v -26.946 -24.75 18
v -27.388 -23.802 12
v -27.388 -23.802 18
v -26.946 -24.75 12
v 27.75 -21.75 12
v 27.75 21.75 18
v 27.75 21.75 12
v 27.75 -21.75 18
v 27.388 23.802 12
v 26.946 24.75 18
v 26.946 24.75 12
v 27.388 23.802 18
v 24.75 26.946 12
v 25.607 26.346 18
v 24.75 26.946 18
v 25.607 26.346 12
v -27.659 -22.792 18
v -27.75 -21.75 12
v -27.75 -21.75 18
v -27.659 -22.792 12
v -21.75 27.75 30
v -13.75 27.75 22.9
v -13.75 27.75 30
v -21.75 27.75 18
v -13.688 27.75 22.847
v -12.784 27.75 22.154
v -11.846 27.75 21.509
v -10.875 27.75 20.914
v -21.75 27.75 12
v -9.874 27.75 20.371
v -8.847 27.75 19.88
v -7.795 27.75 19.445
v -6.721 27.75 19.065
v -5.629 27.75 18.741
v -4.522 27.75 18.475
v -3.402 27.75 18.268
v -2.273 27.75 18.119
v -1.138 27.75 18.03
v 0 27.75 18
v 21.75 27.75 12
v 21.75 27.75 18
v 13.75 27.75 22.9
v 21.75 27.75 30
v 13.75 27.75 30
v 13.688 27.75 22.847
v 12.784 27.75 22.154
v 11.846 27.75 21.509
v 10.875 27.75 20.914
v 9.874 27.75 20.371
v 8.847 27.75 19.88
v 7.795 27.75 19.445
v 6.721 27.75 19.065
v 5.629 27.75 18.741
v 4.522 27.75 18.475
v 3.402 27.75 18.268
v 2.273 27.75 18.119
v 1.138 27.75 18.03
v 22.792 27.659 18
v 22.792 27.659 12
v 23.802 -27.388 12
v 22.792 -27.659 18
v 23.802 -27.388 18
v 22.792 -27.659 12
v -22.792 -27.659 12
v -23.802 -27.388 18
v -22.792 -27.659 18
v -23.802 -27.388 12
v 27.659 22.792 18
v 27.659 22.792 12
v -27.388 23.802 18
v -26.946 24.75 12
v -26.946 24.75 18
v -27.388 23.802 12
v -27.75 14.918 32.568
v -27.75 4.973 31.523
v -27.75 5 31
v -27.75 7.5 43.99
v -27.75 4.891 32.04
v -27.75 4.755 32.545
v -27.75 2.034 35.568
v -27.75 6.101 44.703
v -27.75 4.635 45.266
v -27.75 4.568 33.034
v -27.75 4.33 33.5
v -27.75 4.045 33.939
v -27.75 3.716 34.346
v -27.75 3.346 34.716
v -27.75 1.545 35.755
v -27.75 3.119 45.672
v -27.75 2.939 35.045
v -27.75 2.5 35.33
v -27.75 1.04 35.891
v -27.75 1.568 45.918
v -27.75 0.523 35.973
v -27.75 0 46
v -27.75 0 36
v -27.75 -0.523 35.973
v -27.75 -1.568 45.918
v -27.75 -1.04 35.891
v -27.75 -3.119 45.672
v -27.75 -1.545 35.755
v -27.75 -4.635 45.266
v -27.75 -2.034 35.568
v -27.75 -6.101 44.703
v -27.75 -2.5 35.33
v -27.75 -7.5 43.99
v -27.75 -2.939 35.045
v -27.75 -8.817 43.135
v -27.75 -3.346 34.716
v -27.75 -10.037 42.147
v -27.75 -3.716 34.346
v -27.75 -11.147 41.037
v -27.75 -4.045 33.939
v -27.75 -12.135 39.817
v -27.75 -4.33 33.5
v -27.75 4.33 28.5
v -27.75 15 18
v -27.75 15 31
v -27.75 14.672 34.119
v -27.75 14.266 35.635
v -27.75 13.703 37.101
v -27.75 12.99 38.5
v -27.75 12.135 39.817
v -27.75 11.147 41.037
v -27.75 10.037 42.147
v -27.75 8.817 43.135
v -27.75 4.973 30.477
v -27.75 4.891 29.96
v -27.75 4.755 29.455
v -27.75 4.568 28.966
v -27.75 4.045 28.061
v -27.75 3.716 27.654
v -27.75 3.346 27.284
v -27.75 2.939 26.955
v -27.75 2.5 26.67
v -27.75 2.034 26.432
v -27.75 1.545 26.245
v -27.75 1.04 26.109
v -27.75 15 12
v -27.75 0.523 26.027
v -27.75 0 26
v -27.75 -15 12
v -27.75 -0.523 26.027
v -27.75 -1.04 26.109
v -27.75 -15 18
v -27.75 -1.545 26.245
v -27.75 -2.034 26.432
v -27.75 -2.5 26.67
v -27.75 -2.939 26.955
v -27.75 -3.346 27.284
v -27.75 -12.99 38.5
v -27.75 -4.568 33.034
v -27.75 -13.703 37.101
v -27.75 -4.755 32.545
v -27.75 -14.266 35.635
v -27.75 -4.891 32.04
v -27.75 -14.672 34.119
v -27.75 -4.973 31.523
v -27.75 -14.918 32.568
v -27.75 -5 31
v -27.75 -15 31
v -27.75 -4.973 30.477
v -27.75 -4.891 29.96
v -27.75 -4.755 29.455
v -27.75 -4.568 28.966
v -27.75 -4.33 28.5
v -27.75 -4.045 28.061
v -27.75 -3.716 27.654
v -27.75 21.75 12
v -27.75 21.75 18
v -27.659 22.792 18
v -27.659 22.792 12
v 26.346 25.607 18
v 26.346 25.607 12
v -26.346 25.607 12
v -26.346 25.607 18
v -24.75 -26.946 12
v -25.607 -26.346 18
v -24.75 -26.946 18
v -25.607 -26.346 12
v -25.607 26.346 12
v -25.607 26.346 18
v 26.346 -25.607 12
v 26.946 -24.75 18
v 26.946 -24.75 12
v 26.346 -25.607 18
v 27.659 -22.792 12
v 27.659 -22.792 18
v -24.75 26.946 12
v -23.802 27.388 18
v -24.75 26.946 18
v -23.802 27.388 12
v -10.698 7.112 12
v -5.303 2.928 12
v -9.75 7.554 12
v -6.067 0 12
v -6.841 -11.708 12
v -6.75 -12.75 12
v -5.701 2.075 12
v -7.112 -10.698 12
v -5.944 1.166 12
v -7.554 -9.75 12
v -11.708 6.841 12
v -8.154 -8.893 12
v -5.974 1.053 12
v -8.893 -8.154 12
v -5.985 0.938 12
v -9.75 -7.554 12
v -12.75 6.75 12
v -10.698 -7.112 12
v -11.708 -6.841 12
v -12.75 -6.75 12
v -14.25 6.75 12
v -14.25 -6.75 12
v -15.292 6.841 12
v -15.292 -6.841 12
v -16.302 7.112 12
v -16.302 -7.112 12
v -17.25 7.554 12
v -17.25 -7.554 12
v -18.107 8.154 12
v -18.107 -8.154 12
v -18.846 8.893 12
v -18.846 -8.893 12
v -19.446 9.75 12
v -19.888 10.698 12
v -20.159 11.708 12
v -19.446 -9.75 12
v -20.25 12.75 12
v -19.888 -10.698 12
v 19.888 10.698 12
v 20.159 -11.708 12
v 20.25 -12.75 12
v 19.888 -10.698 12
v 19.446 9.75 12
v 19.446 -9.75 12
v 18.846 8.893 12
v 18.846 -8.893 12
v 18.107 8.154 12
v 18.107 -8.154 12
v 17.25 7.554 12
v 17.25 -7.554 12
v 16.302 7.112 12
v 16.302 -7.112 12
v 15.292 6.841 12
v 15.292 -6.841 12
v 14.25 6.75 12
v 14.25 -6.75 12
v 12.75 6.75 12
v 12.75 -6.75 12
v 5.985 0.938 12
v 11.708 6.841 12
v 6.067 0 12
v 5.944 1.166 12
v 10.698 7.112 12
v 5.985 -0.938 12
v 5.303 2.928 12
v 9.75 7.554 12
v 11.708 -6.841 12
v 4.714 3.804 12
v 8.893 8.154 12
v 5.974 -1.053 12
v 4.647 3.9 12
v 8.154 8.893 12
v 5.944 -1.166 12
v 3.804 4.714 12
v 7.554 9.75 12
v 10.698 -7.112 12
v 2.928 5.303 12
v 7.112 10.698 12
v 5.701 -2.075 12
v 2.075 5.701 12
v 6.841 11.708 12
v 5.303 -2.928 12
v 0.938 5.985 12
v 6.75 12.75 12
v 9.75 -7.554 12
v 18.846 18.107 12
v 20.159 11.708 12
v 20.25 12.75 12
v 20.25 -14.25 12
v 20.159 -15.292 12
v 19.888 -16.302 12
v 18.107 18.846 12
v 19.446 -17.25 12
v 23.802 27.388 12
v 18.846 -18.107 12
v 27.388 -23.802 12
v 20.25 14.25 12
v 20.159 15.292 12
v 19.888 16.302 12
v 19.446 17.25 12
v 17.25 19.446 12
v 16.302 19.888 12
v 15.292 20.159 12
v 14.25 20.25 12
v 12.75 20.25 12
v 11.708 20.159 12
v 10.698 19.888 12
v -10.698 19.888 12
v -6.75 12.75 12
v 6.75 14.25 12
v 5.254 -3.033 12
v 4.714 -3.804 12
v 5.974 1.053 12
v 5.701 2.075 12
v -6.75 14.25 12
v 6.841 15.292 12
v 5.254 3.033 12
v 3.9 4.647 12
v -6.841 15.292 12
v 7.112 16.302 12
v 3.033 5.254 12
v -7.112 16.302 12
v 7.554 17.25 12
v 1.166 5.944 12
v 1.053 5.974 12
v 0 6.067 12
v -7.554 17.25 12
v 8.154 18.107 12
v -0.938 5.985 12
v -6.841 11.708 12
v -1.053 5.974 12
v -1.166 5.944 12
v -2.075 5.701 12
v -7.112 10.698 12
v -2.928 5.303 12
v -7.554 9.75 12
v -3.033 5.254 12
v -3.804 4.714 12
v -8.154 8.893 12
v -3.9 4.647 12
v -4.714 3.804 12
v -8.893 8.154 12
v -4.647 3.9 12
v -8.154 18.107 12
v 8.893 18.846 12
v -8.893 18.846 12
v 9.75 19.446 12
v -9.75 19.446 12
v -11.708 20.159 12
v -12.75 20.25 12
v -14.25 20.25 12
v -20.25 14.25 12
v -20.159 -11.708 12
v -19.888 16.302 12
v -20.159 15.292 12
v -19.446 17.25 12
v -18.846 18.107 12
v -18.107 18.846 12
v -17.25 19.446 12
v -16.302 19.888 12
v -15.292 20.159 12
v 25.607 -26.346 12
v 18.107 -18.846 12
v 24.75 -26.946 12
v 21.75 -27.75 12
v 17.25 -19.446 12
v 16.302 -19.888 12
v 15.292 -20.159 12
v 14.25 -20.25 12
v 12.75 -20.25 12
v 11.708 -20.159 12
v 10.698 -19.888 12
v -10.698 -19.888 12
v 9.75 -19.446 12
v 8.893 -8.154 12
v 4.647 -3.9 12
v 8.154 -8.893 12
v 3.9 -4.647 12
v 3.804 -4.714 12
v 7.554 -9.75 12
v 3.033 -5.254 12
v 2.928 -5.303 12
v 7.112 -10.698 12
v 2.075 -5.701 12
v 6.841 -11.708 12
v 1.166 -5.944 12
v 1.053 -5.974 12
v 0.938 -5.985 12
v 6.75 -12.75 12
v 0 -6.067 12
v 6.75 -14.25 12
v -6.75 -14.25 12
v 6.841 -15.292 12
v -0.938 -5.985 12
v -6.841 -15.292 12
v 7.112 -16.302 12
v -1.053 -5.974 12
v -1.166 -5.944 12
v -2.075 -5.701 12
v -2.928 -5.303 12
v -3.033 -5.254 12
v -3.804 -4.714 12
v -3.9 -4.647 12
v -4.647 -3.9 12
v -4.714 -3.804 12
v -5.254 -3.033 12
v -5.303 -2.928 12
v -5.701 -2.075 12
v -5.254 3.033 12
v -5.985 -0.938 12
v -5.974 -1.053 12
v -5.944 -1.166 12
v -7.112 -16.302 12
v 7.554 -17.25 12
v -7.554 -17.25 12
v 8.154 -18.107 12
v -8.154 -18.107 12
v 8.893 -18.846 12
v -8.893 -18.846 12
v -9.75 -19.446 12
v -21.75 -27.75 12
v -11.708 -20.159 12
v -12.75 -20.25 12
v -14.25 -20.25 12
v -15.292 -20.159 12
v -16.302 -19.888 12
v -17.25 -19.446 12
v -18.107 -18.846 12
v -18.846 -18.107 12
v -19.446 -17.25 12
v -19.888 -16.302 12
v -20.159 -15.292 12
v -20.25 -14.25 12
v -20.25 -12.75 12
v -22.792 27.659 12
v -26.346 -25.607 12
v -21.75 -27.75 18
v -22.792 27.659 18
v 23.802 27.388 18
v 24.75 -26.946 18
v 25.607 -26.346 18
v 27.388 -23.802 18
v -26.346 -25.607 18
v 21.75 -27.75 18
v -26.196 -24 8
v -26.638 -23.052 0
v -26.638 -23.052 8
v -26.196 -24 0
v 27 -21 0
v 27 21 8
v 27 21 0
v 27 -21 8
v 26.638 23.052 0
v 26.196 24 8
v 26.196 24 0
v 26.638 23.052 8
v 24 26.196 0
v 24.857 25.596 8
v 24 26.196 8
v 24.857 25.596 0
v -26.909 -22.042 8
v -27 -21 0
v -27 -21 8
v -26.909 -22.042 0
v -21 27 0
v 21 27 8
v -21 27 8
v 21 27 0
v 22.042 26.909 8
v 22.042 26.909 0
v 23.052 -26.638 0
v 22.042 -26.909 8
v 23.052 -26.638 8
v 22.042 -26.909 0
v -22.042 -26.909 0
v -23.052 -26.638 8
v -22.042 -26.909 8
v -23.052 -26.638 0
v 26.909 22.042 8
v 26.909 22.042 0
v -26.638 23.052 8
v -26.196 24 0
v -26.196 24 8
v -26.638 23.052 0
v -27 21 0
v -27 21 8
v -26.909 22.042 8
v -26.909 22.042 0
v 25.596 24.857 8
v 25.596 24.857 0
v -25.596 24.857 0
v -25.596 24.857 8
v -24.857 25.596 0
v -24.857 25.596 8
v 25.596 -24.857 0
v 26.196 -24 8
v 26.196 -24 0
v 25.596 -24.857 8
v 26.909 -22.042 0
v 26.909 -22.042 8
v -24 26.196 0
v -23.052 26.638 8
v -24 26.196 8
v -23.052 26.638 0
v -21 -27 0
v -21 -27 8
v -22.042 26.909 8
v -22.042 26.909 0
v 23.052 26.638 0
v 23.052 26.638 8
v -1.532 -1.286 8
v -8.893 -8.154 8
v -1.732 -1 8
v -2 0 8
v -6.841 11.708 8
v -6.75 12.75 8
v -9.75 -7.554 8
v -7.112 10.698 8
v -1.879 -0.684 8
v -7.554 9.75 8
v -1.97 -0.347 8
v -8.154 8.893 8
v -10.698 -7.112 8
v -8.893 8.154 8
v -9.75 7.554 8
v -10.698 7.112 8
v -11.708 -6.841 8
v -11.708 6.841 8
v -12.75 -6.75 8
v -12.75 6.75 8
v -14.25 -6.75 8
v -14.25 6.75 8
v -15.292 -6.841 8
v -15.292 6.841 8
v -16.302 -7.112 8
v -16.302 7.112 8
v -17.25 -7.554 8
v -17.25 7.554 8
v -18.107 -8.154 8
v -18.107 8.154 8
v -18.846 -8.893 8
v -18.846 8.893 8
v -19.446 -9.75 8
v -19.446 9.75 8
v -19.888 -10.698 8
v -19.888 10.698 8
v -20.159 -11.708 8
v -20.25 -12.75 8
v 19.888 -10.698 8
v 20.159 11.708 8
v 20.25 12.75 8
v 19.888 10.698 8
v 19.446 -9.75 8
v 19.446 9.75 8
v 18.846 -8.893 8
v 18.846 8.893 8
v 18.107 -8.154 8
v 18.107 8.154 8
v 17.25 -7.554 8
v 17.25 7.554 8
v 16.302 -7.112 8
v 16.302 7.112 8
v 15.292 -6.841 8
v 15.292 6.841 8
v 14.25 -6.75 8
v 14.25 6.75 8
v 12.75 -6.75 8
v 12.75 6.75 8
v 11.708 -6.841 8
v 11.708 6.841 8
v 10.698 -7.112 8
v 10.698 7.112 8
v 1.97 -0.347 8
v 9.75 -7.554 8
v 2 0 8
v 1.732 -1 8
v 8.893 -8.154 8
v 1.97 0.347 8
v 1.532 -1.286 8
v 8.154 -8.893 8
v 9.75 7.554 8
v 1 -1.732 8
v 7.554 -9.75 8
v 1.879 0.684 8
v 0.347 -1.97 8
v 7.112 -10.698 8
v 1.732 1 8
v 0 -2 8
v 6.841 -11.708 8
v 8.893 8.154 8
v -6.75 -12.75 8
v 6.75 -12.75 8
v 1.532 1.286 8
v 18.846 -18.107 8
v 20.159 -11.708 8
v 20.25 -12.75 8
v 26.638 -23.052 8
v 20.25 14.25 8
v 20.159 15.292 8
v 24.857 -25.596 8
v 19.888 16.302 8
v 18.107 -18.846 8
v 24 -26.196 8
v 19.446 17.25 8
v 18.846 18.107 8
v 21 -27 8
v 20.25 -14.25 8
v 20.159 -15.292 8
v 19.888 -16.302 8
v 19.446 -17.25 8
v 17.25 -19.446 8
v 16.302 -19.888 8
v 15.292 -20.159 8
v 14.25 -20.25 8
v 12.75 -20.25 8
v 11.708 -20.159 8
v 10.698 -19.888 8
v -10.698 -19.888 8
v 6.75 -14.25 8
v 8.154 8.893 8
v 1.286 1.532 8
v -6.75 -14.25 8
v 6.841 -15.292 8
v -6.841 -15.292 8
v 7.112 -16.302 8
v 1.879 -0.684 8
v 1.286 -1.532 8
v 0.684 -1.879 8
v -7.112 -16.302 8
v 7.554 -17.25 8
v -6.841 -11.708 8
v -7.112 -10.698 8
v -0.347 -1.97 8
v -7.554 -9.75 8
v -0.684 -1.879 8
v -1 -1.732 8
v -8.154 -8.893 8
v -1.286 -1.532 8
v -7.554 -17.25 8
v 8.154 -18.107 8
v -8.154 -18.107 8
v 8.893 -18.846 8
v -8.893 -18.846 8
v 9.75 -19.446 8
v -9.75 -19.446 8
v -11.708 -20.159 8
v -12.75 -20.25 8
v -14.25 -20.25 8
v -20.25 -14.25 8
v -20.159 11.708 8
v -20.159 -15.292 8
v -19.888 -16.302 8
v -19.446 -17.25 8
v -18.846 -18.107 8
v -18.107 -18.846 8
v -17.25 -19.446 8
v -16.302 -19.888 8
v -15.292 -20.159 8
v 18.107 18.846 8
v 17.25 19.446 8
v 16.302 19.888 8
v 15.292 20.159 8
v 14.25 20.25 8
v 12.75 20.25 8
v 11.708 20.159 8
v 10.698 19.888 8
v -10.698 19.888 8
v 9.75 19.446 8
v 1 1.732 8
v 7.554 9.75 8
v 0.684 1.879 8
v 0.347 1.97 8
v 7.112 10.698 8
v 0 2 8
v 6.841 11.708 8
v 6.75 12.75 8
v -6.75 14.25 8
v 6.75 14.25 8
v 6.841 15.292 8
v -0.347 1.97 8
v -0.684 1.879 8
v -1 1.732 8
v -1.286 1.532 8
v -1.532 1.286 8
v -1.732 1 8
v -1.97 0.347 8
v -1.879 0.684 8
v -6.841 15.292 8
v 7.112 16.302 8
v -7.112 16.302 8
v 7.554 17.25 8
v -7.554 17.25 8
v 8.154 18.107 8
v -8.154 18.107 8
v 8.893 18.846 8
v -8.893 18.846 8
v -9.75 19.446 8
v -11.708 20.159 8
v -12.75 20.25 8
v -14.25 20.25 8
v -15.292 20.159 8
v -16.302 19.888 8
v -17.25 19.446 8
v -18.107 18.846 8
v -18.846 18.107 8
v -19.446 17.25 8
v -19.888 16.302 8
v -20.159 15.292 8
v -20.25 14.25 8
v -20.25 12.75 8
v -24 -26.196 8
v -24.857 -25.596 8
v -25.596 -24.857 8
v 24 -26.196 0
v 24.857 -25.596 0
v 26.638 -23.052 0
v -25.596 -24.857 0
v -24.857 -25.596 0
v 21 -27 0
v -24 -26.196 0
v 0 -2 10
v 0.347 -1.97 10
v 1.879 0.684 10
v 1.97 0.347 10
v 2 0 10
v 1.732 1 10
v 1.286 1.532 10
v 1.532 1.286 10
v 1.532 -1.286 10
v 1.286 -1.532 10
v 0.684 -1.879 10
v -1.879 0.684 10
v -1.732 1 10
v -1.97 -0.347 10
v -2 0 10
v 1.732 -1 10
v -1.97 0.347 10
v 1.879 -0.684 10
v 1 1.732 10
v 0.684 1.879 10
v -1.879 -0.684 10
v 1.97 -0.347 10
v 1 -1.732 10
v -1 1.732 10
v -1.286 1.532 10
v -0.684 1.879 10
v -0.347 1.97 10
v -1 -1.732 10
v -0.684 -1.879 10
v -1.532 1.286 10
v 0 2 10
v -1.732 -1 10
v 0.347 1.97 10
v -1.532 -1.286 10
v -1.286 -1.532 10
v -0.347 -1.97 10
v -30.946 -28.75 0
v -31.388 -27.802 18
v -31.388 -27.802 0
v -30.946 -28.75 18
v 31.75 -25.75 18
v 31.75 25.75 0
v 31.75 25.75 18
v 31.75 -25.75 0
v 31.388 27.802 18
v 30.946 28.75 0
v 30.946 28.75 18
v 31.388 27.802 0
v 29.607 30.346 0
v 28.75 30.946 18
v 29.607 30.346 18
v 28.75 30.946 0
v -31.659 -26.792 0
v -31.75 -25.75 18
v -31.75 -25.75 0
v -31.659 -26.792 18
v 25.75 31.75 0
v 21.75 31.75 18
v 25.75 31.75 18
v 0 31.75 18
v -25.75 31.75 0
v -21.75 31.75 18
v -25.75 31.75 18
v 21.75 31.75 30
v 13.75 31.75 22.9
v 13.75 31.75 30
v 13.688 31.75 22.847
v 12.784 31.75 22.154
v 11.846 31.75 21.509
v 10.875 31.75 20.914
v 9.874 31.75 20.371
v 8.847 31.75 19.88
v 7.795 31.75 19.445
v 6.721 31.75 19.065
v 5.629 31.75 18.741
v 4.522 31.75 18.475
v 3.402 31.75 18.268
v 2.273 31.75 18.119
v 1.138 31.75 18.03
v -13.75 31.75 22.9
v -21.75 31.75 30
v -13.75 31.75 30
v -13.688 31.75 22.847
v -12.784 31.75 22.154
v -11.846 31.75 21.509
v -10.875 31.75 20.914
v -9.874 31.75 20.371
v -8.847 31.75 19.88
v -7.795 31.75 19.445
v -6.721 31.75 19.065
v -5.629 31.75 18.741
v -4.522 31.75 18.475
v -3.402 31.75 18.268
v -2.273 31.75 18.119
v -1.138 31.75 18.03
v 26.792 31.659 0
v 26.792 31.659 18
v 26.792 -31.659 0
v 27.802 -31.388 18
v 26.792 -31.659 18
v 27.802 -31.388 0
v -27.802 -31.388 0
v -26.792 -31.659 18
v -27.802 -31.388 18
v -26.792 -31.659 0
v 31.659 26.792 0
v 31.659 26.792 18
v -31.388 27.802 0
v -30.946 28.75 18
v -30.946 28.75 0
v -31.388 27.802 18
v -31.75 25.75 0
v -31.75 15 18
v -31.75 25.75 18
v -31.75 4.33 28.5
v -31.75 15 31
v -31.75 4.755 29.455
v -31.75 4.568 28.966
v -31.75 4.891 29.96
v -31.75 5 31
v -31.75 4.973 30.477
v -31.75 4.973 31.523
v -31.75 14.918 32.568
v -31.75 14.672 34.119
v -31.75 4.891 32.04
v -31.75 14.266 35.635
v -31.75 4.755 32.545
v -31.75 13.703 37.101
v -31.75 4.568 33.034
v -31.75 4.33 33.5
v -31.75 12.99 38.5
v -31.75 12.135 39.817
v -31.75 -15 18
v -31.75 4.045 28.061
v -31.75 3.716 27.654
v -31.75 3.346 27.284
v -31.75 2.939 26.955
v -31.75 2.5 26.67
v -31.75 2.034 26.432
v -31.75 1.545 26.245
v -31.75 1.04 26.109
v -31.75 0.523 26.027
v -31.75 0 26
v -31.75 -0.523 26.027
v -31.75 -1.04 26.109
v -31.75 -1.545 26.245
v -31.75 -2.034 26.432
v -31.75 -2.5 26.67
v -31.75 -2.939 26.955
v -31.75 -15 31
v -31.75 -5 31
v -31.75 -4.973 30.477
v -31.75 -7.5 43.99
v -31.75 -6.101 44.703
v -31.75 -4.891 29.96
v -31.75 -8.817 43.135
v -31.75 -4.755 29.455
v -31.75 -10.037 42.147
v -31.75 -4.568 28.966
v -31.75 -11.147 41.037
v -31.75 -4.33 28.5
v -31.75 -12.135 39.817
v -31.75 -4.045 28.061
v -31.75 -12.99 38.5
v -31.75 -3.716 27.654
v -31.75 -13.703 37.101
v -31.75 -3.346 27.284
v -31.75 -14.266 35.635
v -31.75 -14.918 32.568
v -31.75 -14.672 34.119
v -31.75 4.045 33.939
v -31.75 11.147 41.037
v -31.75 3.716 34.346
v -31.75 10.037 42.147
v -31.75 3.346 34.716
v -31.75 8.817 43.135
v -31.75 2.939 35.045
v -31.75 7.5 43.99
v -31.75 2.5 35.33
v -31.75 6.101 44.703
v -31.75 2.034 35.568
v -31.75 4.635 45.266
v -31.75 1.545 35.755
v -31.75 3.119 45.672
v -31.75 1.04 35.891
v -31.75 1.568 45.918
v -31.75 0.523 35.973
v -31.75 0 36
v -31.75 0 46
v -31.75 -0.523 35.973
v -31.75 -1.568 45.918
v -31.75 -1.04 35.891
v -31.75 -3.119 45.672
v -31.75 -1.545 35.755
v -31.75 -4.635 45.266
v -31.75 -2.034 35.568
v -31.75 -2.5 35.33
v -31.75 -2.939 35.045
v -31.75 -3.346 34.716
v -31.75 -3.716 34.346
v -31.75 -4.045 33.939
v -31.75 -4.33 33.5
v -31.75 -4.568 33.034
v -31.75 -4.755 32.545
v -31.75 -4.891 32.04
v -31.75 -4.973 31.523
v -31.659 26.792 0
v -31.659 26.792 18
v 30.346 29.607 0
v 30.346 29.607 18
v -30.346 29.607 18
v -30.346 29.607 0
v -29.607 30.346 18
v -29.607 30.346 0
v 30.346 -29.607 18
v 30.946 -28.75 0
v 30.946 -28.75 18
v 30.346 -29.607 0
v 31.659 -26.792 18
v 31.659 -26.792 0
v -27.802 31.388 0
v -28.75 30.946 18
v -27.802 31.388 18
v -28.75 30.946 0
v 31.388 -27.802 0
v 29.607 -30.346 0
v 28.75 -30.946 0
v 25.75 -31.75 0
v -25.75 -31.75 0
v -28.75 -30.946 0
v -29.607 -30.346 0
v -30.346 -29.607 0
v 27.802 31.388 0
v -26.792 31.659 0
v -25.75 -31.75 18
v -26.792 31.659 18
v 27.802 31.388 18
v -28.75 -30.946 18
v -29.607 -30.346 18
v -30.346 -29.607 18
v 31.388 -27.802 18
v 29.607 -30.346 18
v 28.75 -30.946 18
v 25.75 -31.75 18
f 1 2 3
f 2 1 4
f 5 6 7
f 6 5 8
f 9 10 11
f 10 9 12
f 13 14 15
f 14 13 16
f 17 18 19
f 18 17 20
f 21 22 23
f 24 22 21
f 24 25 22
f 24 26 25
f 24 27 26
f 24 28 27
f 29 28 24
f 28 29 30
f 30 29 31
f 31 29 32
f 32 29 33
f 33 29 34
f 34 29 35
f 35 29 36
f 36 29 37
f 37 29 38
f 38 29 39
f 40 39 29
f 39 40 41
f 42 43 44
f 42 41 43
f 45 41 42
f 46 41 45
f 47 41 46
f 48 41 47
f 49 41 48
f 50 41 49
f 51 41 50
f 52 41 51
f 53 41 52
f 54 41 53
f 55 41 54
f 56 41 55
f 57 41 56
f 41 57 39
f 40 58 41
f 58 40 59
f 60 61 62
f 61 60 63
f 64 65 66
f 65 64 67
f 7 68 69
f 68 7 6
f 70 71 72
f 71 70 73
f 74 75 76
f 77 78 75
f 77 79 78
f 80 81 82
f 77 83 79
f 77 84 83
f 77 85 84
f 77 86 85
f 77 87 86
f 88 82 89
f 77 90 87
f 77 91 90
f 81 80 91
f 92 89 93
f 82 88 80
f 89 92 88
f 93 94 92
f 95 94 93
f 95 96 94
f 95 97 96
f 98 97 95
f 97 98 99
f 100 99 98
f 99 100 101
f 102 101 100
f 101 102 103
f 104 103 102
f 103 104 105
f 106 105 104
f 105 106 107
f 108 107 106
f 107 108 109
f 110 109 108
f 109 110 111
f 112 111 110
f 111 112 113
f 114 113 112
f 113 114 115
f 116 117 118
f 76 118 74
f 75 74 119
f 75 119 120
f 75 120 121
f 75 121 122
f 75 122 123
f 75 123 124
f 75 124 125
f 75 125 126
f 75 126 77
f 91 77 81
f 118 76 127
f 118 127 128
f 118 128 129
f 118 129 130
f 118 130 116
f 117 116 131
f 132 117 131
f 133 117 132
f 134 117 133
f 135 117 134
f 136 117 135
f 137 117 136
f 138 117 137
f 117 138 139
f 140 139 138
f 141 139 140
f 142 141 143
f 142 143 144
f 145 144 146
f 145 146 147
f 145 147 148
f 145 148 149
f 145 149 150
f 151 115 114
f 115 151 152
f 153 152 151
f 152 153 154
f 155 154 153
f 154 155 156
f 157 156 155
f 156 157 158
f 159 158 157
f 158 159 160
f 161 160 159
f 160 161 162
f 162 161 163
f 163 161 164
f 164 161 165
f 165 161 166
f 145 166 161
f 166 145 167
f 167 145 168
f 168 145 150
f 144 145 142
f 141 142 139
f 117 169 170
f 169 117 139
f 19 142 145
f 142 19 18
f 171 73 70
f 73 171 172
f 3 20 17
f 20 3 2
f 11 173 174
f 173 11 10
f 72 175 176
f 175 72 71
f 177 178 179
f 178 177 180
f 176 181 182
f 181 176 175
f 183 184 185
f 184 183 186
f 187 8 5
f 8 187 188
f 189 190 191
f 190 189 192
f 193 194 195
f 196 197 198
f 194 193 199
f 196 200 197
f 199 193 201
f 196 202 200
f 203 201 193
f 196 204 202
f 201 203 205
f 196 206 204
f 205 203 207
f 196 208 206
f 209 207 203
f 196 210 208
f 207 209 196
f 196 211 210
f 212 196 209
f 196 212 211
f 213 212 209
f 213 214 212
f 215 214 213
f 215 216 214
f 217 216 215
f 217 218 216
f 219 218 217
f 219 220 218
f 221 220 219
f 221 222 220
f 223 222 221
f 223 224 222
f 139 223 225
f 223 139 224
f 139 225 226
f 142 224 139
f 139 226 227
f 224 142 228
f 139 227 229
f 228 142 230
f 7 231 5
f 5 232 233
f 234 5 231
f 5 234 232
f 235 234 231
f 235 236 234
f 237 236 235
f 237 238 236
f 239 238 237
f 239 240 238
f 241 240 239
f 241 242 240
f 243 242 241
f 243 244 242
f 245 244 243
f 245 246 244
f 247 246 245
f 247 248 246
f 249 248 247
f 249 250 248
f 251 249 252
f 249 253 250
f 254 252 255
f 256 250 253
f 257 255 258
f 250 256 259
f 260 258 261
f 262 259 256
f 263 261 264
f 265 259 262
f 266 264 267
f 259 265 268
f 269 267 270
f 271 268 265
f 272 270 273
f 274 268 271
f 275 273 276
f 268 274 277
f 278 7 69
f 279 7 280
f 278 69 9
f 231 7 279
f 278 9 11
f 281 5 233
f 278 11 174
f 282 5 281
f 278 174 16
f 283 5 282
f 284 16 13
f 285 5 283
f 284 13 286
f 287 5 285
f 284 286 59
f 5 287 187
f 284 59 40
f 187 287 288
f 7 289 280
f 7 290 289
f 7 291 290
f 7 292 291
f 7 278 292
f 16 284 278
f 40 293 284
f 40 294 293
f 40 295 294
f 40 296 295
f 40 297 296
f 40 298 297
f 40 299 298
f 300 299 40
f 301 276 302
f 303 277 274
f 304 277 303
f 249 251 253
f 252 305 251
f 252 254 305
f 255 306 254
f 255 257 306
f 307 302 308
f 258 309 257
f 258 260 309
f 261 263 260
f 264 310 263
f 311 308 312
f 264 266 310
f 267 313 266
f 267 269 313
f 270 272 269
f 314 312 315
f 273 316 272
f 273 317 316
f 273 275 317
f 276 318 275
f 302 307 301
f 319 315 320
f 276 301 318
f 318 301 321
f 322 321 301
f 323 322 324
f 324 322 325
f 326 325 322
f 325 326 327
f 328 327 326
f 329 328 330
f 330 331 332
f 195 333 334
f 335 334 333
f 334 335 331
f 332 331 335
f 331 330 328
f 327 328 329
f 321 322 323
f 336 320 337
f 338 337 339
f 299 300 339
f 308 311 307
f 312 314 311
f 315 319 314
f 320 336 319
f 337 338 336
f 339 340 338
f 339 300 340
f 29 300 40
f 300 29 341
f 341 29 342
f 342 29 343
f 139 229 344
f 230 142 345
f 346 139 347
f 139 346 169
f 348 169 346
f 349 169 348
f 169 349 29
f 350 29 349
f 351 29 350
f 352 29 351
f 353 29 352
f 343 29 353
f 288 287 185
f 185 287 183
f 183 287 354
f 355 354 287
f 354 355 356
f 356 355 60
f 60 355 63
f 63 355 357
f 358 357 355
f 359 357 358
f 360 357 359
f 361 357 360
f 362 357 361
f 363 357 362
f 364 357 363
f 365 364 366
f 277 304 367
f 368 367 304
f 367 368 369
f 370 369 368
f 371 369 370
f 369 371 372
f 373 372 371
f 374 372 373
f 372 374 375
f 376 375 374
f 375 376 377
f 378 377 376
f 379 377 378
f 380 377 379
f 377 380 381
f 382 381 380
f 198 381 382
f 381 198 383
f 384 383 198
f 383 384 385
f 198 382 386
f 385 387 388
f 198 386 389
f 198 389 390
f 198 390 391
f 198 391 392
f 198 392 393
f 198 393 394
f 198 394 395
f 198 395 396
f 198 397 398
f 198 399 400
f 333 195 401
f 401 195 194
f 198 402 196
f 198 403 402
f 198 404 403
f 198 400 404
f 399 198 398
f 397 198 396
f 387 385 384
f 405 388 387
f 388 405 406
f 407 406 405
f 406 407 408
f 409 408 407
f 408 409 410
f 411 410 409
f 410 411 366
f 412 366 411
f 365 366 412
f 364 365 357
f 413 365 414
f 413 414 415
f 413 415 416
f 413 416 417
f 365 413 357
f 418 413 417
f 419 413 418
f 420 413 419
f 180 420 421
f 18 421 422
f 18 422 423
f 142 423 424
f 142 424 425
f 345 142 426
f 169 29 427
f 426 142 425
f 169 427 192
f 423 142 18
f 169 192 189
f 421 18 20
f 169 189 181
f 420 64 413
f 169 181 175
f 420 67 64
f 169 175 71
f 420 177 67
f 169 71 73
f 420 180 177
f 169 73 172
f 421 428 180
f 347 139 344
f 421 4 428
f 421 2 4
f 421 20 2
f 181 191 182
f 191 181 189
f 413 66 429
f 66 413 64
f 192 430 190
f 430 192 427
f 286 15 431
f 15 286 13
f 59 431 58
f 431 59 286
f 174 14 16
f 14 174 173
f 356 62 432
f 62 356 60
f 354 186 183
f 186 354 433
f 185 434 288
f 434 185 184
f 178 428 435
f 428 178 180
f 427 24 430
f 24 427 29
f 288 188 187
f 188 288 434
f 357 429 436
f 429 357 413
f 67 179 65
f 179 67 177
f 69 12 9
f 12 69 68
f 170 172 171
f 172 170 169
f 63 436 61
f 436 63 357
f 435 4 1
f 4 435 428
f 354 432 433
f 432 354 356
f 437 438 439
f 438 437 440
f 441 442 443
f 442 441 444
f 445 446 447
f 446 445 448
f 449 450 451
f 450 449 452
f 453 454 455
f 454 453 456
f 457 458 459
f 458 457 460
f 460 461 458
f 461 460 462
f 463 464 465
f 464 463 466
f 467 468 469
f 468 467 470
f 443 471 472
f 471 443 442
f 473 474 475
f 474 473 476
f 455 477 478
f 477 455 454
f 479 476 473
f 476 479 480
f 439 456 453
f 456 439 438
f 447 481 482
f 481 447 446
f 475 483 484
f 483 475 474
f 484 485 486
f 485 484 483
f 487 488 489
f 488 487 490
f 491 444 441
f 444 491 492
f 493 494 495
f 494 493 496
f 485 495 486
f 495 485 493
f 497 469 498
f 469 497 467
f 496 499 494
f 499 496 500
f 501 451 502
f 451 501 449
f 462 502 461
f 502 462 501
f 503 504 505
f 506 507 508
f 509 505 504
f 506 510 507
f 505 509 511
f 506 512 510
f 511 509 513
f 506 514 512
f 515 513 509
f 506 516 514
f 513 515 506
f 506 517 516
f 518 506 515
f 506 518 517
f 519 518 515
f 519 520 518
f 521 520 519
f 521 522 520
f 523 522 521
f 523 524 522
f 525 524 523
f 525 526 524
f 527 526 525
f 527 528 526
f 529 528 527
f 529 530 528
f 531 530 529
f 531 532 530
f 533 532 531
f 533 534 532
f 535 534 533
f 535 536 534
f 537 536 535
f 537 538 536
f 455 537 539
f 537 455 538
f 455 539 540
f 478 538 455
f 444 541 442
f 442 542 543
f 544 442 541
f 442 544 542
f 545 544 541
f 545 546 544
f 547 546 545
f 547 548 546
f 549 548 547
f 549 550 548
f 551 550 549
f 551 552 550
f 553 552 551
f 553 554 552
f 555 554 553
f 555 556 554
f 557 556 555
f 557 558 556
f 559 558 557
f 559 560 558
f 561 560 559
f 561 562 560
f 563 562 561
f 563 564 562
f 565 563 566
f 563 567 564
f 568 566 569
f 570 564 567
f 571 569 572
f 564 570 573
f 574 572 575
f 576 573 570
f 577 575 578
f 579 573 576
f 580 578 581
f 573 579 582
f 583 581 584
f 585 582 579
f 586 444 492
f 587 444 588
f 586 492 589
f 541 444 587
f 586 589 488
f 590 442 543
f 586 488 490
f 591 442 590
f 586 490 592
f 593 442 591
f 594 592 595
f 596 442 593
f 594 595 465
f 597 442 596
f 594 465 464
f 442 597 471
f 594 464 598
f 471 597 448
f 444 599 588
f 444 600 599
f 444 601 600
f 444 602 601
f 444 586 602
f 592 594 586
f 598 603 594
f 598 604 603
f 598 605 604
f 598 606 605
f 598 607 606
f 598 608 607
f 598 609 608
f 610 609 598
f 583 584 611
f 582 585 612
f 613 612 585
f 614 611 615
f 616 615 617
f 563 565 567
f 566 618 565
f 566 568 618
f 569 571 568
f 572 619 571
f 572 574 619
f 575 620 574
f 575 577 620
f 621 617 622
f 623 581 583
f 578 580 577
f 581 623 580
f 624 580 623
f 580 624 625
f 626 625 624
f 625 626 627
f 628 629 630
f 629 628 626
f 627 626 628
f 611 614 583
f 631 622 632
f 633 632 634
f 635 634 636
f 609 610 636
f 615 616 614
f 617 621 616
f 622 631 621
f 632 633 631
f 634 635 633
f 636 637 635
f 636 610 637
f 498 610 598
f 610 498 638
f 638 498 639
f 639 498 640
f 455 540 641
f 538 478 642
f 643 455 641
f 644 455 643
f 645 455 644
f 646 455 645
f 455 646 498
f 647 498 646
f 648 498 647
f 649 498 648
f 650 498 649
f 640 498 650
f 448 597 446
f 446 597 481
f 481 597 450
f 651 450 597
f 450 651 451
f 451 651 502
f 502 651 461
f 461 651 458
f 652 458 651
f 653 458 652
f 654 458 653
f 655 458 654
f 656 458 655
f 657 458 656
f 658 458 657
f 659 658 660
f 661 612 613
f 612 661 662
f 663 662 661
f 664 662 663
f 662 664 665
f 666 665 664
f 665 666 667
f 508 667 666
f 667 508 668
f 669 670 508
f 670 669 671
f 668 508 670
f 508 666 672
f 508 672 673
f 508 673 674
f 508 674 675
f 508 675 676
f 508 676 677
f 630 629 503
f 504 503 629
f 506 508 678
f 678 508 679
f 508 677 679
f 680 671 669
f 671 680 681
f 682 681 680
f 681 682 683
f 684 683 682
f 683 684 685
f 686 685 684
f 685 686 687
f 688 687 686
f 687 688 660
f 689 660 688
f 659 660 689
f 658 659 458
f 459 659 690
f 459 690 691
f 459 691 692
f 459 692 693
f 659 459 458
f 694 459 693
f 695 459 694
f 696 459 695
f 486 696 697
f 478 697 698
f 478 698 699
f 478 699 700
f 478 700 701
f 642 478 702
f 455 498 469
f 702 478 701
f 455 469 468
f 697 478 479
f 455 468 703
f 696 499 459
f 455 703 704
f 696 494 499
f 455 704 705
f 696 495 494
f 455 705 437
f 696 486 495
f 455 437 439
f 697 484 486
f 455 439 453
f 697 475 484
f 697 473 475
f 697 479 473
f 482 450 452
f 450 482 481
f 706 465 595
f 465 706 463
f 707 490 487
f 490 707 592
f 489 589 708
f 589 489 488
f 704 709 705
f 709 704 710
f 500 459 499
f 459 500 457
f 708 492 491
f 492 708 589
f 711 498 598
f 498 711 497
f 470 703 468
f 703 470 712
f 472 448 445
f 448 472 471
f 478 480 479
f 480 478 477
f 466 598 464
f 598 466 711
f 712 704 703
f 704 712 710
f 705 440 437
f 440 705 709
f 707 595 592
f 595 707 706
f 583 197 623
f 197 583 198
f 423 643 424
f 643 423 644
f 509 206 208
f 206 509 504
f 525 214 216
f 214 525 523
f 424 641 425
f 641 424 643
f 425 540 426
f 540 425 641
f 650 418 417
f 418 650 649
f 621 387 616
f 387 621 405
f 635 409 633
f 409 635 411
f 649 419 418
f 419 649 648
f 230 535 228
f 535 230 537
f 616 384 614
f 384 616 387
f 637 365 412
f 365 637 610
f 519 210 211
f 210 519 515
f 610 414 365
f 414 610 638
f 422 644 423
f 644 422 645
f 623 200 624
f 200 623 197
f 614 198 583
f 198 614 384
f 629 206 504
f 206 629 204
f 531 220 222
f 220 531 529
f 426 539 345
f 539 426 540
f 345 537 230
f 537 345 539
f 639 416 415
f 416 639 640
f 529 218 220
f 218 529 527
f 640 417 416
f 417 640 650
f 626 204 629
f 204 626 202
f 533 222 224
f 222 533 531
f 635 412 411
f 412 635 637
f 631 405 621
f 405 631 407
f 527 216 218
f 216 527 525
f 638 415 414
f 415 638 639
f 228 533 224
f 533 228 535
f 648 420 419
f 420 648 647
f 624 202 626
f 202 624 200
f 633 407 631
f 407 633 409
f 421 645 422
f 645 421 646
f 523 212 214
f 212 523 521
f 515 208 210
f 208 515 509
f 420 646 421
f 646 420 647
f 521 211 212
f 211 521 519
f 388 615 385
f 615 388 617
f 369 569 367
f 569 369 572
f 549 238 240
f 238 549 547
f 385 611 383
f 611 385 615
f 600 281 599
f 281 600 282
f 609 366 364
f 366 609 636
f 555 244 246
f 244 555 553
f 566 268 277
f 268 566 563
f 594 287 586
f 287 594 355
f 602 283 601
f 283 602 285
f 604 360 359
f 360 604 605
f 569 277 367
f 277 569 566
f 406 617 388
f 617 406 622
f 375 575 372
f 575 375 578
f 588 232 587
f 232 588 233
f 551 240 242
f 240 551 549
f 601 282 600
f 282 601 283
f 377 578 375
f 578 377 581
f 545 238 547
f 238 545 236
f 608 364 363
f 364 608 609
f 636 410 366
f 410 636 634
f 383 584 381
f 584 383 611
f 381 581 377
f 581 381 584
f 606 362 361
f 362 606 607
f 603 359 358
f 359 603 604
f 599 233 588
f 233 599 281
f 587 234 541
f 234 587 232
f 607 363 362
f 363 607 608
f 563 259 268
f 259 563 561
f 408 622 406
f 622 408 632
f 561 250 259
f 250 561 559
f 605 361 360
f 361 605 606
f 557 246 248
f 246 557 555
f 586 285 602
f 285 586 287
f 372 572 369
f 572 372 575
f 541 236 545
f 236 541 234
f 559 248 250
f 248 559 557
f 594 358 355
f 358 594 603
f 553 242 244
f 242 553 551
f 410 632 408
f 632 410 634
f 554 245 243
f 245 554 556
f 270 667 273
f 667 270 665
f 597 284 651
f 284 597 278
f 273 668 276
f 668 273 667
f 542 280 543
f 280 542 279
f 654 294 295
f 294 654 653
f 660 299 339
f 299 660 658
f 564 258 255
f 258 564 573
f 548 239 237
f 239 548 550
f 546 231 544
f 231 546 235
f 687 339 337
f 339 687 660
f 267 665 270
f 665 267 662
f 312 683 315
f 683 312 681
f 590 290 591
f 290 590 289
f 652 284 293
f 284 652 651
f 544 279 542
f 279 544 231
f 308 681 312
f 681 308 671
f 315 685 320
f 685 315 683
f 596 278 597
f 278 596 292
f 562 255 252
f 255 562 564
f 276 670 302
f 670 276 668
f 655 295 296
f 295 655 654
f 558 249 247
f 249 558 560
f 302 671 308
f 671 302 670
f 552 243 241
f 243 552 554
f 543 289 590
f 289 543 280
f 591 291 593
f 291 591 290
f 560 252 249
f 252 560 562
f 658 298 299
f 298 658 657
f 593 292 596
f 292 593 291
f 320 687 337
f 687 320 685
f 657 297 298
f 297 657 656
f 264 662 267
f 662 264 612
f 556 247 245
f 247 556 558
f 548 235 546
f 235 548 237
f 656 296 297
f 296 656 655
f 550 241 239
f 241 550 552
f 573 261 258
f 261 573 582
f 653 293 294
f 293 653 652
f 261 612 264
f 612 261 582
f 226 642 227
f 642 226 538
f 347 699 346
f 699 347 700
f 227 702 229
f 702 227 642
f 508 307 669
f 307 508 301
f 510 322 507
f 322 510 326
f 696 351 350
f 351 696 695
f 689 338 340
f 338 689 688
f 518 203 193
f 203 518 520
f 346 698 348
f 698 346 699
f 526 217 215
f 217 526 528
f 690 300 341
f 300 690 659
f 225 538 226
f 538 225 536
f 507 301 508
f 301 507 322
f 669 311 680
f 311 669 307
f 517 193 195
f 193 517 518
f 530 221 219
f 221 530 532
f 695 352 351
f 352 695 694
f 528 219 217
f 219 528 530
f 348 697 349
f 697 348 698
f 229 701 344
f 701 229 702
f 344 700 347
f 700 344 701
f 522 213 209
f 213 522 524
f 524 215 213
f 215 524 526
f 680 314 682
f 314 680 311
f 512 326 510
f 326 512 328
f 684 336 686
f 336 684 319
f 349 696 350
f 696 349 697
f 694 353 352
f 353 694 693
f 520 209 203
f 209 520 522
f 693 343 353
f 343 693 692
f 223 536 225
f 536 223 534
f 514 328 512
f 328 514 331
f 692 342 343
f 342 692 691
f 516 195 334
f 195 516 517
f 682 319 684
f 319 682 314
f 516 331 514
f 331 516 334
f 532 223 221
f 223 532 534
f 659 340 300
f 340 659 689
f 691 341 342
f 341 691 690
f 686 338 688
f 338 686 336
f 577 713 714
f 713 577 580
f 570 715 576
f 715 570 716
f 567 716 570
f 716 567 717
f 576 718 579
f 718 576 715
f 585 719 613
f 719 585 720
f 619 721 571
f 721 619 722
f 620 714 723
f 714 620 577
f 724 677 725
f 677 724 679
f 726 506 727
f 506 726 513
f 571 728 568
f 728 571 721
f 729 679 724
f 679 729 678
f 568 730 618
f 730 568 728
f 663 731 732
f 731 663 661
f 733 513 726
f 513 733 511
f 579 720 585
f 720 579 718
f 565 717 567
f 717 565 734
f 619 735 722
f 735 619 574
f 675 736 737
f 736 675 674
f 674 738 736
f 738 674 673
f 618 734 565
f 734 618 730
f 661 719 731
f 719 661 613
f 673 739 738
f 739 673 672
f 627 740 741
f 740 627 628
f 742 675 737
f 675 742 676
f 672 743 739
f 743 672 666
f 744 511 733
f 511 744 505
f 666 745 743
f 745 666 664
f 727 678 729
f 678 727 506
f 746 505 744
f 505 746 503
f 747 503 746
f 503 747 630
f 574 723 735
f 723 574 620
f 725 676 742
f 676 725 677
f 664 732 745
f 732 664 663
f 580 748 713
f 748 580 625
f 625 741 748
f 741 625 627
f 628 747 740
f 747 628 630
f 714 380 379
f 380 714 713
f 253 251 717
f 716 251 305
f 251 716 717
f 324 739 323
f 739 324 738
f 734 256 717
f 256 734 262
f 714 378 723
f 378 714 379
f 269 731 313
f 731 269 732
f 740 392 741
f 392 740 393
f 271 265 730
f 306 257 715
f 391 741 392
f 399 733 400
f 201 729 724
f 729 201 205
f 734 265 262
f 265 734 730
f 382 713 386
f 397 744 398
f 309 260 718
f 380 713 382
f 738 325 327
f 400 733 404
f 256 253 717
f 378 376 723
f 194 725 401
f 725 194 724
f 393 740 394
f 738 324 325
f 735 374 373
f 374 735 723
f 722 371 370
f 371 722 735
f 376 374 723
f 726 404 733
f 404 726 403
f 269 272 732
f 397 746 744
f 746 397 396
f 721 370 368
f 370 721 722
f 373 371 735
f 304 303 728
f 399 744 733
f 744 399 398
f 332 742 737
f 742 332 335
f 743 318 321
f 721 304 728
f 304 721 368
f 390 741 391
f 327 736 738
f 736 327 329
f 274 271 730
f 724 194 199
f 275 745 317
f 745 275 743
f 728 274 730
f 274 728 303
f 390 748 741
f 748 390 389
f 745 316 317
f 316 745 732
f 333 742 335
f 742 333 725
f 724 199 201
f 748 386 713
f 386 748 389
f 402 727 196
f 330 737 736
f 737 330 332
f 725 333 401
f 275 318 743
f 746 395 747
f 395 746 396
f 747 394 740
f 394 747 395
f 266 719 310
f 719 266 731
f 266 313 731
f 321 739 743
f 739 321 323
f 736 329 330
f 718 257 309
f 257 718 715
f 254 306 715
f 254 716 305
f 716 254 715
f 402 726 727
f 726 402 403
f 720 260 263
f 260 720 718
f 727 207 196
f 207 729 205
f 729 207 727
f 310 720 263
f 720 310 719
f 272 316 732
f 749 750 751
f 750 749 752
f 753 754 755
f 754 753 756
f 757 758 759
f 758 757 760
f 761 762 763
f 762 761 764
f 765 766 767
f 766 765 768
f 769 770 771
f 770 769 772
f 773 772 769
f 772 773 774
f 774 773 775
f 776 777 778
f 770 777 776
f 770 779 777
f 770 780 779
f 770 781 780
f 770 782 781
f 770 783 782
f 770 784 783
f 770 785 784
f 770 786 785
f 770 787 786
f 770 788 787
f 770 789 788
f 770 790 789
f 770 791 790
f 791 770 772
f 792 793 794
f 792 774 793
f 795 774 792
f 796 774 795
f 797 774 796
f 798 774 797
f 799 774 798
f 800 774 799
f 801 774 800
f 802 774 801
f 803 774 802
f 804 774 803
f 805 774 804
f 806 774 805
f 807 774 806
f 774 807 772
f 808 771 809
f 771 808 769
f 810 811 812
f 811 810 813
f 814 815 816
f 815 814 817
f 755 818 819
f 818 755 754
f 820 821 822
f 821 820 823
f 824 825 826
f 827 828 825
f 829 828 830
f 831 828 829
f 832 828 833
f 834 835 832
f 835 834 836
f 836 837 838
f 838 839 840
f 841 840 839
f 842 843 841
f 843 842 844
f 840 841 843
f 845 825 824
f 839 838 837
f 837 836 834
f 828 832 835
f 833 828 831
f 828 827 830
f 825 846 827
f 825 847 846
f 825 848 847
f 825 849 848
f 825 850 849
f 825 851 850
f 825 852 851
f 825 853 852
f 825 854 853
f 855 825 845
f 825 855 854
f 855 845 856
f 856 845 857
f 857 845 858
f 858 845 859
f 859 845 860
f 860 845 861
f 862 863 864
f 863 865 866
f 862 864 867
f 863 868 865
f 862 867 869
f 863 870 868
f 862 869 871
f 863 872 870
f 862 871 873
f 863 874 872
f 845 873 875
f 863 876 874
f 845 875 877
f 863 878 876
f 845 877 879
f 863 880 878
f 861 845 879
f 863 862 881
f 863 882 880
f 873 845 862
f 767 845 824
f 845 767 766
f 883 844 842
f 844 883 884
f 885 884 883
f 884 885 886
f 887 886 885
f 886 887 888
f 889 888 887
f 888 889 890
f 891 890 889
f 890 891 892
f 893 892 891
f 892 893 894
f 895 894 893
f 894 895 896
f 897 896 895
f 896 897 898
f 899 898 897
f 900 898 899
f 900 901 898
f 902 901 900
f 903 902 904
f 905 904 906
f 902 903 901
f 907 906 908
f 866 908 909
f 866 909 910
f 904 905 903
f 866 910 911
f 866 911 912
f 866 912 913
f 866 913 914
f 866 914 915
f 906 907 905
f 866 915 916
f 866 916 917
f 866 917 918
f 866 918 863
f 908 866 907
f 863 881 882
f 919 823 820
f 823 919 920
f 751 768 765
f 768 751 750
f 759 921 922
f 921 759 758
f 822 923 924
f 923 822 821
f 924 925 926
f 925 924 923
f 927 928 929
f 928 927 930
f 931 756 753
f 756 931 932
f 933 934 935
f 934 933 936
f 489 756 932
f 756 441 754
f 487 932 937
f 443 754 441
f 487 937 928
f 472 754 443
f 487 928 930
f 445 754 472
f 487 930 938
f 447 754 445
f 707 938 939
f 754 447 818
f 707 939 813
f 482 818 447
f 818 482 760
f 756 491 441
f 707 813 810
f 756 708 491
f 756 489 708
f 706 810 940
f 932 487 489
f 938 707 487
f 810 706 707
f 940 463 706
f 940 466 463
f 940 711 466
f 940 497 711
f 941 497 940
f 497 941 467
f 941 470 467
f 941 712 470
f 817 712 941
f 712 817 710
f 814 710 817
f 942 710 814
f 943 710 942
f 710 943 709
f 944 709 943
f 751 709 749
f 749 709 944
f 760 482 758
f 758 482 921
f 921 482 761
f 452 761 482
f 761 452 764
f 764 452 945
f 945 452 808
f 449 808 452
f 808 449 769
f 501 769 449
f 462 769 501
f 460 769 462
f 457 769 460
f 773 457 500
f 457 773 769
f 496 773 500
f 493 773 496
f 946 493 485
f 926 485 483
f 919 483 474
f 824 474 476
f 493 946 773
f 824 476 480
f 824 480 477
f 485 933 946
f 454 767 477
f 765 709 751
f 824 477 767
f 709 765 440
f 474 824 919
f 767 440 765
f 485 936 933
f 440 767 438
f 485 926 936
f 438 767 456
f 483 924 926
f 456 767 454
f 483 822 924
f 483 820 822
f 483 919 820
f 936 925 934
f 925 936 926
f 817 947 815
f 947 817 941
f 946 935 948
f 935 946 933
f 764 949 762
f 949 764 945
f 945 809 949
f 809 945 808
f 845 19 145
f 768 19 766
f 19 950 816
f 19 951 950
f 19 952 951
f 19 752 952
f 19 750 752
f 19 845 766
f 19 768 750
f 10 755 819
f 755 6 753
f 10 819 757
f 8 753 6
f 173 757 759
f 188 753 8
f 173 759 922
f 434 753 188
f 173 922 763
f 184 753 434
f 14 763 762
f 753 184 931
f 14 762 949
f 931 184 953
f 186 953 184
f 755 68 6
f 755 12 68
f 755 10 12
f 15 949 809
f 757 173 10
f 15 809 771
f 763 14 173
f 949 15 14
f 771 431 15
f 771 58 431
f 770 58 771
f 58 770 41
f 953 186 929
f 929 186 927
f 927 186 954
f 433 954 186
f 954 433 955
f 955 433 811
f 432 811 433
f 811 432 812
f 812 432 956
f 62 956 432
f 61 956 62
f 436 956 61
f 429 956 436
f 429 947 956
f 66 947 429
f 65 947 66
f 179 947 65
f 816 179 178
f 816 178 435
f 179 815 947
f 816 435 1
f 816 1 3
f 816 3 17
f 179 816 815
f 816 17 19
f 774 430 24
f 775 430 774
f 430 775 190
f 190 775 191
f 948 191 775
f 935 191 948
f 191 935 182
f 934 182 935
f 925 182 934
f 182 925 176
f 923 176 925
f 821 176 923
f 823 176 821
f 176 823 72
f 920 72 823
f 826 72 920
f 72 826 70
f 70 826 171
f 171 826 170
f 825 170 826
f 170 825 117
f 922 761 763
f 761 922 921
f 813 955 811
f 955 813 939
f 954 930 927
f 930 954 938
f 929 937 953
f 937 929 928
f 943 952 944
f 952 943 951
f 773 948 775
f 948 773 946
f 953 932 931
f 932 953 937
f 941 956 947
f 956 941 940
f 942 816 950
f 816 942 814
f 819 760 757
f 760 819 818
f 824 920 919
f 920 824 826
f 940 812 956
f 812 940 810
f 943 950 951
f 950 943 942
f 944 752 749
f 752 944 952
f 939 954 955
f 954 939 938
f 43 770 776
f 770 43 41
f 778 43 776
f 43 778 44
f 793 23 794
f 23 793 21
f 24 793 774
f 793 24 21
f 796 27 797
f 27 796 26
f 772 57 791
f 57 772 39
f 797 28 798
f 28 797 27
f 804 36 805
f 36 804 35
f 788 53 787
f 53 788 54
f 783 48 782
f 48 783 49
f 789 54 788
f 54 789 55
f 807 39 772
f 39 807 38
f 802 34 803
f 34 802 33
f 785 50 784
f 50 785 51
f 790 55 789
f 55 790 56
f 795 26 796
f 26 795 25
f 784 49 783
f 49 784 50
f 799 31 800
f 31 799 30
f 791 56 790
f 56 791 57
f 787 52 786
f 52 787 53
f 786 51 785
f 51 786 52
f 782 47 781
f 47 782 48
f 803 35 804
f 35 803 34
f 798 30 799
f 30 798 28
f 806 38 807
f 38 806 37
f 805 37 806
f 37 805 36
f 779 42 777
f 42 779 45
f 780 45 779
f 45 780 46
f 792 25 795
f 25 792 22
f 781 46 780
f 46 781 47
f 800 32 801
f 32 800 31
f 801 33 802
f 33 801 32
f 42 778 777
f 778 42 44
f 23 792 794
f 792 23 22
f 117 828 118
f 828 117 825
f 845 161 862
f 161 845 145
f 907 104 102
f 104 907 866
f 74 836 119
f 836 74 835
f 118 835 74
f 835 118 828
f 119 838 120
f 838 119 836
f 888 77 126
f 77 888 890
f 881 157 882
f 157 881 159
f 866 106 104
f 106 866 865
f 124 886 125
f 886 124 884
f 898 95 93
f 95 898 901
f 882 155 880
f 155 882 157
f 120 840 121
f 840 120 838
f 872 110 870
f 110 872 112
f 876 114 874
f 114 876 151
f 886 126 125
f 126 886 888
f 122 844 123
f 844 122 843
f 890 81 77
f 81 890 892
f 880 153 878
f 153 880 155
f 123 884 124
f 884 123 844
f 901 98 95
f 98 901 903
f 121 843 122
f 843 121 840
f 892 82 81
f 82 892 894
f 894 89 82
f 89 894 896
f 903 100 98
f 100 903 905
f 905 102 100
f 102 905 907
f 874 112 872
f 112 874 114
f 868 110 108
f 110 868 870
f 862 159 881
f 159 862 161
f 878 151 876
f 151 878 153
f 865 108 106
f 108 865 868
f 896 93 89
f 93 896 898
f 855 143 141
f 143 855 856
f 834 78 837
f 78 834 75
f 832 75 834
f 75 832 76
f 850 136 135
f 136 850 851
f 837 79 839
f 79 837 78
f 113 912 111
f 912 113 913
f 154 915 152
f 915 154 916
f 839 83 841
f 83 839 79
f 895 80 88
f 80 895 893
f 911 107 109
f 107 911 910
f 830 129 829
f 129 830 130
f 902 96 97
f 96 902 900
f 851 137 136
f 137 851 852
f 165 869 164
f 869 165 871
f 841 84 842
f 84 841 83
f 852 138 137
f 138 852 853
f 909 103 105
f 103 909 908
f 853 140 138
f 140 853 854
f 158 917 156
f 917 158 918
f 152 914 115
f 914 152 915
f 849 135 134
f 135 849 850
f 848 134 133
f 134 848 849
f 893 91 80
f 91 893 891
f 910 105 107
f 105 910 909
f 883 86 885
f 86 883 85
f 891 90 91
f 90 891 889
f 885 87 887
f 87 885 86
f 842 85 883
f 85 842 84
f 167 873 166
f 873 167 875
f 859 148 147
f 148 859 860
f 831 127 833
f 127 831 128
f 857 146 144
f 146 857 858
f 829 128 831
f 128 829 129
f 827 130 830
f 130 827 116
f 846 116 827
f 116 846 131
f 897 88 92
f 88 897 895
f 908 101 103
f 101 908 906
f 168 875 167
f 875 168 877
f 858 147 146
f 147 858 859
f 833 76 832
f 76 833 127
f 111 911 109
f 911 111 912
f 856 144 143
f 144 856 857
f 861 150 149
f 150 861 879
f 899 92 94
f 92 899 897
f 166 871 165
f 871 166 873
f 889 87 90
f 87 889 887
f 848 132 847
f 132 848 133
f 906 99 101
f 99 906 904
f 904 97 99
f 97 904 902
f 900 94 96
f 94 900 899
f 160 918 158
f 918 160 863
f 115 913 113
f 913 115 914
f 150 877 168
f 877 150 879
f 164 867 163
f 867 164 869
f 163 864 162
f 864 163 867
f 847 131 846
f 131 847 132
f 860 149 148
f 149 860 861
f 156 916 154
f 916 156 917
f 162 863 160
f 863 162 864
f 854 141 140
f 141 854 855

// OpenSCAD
// Measure posts: a, b
Atop = 55.5; // mm - due to printing, this is actually the bottom, i.e. bed (yeah, confusion!)
Btop = 55.5; // mm

Abottom = 54; // mm - this will be the top, i.e. cave
Bbottom = 54;

Hmid = 4; // height of center plate
Htop = 6; // height of top (before it reaches the wooden connectors of the bed)
Hbottom = 8;
H = Htop + Hbottom + Hmid; // mm
R = 6; // corner radius
border = 4; // thickness of outer walls
FN=36; // number of faces to approximate circles

Dscrew = 4; // screw in the middle (to fix it onto the cave)
Rscrew = Dscrew/2.0; // screw radius
RscrewHat = 8.1;
module Basis()
{
    difference()
    {
        Amax = max(Abottom, Atop);
        Amin = min(Abottom, Atop);
        Bmax = max(Bbottom, Btop);
        Bmin = min(Bbottom, Btop);
        
        roundedRect([Amax+2*border, Bmax+2*border, H], R, $fn=FN);
        
        union()
        {
            // Carving top
            translate([0,0,Hbottom+Hmid])
            roundedRect([Atop, Btop, Htop + border], R, $fn=FN);
            
            // Carving bottom
            translate([0,0,-border])
            roundedRect([Abottom, Bbottom, Hbottom + border], R, $fn=FN);
            
            ///////// Cut outs of the middle plate:
            // Bottom-left
            translate([-Amin/4, -Bmin/4, -border])
            roundedRect([Amin/4, Bmin/4, H+2*border], R, $fn=FN);
            // Bottom-right
            translate([Amin/4, -Bmin/4, -border])
            roundedRect([Amin/4, Bmin/4, H+2*border], R, $fn=FN);
            // Top-right
            translate([Amin/4, Bmin/4, -border])
            roundedRect([Amin/4, Bmin/4, H+2*border], R, $fn=FN);
            // Top-left
            translate([-Amin/4, Bmin/4, -border])
            roundedRect([Amin/4, Bmin/4, H+2*border], R, $fn=FN);
            
            // Screw
            cylinder(h=H+2*border, r=Rscrew, $fn=FN, center=true);
            // TODO cones - abmessen!
            translate([0,0,Hbottom+Hmid/2])
            cylinder(h=Hmid/2+1, r1=Rscrew, r2=RscrewHat, $fn=FN, center=false);
            // cylinder(r1=,r2=)...
        }
    }
}

// size - [x,y,z]
// radius - radius of corners
module roundedRect(size, radius)
{
	x = size[0];
	y = size[1];
	z = size[2];

	linear_extrude(height=z)
	hull()
	{
		// place 4 circles in the corners, with the given radius
		translate([(-x/2)+(radius), (-y/2)+(radius), 0])
		circle(r=radius);
	
		translate([(x/2)-(radius), (-y/2)+(radius), 0])
		circle(r=radius);
	
		translate([(-x/2)+(radius), (y/2)-(radius), 0])
		circle(r=radius);
	
		translate([(x/2)-(radius), (y/2)-(radius), 0])
		circle(r=radius);
	}
}

module HoleConnector(width, wall, height_hole, hole_diameter, num_faces=36) 
{
    translate([0,0,height_hole/2])
    difference()
    {
        union()
        {
            cube([width, wall, height_hole], true);

            translate([0, 0, height_hole/2.0])
            {
                rotate([90,0,0])
                cylinder(h=wall, r=width/2.0, center=true, $fn=num_faces);
            }
        }
        translate([0, 0, height_hole/2.0])
        rotate([90,0,0])
        cylinder(h=wall+2, d=hole_diameter, center=true, $fn=num_faces);
    }
}

module Cutout(D, H, W_cutout, W_border, wall, num_faces=120)
{
    w=W_cutout+2*W_border;
    translate([0,0,H/2])
    union()
    {
        difference()
        {
            cube([w, wall, H], true);
            
            translate([0,0,w/2+H/2-(H-D)])
            rotate([90,0,0])
            cylinder(h=wall+2, d=w, center=true, $fn=num_faces);
        }
        translate([W_cutout/2+W_border/2,0,0])
        cube([W_border, wall, H], true);
        
        translate([-(W_cutout/2+W_border/2),0,0])
        cube([W_border, wall, H], true);
    }
}



module front_left()
{
    union(){
        Basis();

        center_top=Hbottom+Hmid;
        H=18;
        D=6;
        W_cutout=27.5;
        W_cutout_border=8;
        translate([0,(Atop+border)/2,center_top])
        Cutout(D, H, W_cutout, W_cutout_border, border);
        
        
        cube_width=30;
        cube_height=19;
        hole_diameter=10;
        num_faces=60;
        translate([(Atop+border)/2, 0, center_top])
        rotate([0,0,90])
        HoleConnector(cube_width, border, cube_height, hole_diameter, num_faces);
    }
}

module front_right()
{
    union(){
        Basis();

        center_top=Hbottom+Hmid;
        H=18;
        D=6;
        W_cutout=27.5;
        W_cutout_border=8;
        translate([0,(Atop+border)/2,center_top])
        Cutout(D, H, W_cutout, W_cutout_border, border);
        
        
        cube_width=30;
        cube_height=19;
        hole_diameter=10;
        num_faces=60;
        translate([-(Atop+border)/2, 0, center_top])
        rotate([0,0,90])
        HoleConnector(cube_width, border, cube_height, hole_diameter, num_faces);
    }
}


module back_left()
{
    union(){
        Basis();

        center_top=Hbottom+Hmid;
        H=18;
        D=6;
        W_cutout=27.8;
        W_cutout_border=8;
        translate([0,-(Atop+border)/2,center_top])
        Cutout(D, H, W_cutout, W_cutout_border, border);
            
        translate([-(Atop+border)/2,0,center_top])
        rotate([0,0,90])
        Cutout(D, H, W_cutout, W_cutout_border, border);
        
        cube_width=30;
        cube_height=19;
        hole_diameter=10;
        num_faces=60;
        translate([(Atop+border)/2, 0, center_top])
        rotate([0,0,90])
        HoleConnector(cube_width, border, cube_height, hole_diameter, num_faces);
    }
}


module back_right()
{
    union(){
        Basis();

        center_top=Hbottom+Hmid;
        H=18;
        D=6;
        W_cutout=27.8;
        W_cutout_border=8;
        translate([0,-(Atop+border)/2,center_top])
        Cutout(D, H, W_cutout, W_cutout_border, border);
            
        translate([-(Atop+border)/2,0,center_top])
        rotate([0,0,90])
        Cutout(D, H, W_cutout, W_cutout_border, border);
        
        cube_width=30;
        cube_height=19;
        hole_diameter=10;
        num_faces=60;
        translate([0, (Atop+border)/2, center_top])
        HoleConnector(cube_width, border, cube_height, hole_diameter, num_faces);
    }
}
//front_left();
//back_left();
//back_right();
front_right();
